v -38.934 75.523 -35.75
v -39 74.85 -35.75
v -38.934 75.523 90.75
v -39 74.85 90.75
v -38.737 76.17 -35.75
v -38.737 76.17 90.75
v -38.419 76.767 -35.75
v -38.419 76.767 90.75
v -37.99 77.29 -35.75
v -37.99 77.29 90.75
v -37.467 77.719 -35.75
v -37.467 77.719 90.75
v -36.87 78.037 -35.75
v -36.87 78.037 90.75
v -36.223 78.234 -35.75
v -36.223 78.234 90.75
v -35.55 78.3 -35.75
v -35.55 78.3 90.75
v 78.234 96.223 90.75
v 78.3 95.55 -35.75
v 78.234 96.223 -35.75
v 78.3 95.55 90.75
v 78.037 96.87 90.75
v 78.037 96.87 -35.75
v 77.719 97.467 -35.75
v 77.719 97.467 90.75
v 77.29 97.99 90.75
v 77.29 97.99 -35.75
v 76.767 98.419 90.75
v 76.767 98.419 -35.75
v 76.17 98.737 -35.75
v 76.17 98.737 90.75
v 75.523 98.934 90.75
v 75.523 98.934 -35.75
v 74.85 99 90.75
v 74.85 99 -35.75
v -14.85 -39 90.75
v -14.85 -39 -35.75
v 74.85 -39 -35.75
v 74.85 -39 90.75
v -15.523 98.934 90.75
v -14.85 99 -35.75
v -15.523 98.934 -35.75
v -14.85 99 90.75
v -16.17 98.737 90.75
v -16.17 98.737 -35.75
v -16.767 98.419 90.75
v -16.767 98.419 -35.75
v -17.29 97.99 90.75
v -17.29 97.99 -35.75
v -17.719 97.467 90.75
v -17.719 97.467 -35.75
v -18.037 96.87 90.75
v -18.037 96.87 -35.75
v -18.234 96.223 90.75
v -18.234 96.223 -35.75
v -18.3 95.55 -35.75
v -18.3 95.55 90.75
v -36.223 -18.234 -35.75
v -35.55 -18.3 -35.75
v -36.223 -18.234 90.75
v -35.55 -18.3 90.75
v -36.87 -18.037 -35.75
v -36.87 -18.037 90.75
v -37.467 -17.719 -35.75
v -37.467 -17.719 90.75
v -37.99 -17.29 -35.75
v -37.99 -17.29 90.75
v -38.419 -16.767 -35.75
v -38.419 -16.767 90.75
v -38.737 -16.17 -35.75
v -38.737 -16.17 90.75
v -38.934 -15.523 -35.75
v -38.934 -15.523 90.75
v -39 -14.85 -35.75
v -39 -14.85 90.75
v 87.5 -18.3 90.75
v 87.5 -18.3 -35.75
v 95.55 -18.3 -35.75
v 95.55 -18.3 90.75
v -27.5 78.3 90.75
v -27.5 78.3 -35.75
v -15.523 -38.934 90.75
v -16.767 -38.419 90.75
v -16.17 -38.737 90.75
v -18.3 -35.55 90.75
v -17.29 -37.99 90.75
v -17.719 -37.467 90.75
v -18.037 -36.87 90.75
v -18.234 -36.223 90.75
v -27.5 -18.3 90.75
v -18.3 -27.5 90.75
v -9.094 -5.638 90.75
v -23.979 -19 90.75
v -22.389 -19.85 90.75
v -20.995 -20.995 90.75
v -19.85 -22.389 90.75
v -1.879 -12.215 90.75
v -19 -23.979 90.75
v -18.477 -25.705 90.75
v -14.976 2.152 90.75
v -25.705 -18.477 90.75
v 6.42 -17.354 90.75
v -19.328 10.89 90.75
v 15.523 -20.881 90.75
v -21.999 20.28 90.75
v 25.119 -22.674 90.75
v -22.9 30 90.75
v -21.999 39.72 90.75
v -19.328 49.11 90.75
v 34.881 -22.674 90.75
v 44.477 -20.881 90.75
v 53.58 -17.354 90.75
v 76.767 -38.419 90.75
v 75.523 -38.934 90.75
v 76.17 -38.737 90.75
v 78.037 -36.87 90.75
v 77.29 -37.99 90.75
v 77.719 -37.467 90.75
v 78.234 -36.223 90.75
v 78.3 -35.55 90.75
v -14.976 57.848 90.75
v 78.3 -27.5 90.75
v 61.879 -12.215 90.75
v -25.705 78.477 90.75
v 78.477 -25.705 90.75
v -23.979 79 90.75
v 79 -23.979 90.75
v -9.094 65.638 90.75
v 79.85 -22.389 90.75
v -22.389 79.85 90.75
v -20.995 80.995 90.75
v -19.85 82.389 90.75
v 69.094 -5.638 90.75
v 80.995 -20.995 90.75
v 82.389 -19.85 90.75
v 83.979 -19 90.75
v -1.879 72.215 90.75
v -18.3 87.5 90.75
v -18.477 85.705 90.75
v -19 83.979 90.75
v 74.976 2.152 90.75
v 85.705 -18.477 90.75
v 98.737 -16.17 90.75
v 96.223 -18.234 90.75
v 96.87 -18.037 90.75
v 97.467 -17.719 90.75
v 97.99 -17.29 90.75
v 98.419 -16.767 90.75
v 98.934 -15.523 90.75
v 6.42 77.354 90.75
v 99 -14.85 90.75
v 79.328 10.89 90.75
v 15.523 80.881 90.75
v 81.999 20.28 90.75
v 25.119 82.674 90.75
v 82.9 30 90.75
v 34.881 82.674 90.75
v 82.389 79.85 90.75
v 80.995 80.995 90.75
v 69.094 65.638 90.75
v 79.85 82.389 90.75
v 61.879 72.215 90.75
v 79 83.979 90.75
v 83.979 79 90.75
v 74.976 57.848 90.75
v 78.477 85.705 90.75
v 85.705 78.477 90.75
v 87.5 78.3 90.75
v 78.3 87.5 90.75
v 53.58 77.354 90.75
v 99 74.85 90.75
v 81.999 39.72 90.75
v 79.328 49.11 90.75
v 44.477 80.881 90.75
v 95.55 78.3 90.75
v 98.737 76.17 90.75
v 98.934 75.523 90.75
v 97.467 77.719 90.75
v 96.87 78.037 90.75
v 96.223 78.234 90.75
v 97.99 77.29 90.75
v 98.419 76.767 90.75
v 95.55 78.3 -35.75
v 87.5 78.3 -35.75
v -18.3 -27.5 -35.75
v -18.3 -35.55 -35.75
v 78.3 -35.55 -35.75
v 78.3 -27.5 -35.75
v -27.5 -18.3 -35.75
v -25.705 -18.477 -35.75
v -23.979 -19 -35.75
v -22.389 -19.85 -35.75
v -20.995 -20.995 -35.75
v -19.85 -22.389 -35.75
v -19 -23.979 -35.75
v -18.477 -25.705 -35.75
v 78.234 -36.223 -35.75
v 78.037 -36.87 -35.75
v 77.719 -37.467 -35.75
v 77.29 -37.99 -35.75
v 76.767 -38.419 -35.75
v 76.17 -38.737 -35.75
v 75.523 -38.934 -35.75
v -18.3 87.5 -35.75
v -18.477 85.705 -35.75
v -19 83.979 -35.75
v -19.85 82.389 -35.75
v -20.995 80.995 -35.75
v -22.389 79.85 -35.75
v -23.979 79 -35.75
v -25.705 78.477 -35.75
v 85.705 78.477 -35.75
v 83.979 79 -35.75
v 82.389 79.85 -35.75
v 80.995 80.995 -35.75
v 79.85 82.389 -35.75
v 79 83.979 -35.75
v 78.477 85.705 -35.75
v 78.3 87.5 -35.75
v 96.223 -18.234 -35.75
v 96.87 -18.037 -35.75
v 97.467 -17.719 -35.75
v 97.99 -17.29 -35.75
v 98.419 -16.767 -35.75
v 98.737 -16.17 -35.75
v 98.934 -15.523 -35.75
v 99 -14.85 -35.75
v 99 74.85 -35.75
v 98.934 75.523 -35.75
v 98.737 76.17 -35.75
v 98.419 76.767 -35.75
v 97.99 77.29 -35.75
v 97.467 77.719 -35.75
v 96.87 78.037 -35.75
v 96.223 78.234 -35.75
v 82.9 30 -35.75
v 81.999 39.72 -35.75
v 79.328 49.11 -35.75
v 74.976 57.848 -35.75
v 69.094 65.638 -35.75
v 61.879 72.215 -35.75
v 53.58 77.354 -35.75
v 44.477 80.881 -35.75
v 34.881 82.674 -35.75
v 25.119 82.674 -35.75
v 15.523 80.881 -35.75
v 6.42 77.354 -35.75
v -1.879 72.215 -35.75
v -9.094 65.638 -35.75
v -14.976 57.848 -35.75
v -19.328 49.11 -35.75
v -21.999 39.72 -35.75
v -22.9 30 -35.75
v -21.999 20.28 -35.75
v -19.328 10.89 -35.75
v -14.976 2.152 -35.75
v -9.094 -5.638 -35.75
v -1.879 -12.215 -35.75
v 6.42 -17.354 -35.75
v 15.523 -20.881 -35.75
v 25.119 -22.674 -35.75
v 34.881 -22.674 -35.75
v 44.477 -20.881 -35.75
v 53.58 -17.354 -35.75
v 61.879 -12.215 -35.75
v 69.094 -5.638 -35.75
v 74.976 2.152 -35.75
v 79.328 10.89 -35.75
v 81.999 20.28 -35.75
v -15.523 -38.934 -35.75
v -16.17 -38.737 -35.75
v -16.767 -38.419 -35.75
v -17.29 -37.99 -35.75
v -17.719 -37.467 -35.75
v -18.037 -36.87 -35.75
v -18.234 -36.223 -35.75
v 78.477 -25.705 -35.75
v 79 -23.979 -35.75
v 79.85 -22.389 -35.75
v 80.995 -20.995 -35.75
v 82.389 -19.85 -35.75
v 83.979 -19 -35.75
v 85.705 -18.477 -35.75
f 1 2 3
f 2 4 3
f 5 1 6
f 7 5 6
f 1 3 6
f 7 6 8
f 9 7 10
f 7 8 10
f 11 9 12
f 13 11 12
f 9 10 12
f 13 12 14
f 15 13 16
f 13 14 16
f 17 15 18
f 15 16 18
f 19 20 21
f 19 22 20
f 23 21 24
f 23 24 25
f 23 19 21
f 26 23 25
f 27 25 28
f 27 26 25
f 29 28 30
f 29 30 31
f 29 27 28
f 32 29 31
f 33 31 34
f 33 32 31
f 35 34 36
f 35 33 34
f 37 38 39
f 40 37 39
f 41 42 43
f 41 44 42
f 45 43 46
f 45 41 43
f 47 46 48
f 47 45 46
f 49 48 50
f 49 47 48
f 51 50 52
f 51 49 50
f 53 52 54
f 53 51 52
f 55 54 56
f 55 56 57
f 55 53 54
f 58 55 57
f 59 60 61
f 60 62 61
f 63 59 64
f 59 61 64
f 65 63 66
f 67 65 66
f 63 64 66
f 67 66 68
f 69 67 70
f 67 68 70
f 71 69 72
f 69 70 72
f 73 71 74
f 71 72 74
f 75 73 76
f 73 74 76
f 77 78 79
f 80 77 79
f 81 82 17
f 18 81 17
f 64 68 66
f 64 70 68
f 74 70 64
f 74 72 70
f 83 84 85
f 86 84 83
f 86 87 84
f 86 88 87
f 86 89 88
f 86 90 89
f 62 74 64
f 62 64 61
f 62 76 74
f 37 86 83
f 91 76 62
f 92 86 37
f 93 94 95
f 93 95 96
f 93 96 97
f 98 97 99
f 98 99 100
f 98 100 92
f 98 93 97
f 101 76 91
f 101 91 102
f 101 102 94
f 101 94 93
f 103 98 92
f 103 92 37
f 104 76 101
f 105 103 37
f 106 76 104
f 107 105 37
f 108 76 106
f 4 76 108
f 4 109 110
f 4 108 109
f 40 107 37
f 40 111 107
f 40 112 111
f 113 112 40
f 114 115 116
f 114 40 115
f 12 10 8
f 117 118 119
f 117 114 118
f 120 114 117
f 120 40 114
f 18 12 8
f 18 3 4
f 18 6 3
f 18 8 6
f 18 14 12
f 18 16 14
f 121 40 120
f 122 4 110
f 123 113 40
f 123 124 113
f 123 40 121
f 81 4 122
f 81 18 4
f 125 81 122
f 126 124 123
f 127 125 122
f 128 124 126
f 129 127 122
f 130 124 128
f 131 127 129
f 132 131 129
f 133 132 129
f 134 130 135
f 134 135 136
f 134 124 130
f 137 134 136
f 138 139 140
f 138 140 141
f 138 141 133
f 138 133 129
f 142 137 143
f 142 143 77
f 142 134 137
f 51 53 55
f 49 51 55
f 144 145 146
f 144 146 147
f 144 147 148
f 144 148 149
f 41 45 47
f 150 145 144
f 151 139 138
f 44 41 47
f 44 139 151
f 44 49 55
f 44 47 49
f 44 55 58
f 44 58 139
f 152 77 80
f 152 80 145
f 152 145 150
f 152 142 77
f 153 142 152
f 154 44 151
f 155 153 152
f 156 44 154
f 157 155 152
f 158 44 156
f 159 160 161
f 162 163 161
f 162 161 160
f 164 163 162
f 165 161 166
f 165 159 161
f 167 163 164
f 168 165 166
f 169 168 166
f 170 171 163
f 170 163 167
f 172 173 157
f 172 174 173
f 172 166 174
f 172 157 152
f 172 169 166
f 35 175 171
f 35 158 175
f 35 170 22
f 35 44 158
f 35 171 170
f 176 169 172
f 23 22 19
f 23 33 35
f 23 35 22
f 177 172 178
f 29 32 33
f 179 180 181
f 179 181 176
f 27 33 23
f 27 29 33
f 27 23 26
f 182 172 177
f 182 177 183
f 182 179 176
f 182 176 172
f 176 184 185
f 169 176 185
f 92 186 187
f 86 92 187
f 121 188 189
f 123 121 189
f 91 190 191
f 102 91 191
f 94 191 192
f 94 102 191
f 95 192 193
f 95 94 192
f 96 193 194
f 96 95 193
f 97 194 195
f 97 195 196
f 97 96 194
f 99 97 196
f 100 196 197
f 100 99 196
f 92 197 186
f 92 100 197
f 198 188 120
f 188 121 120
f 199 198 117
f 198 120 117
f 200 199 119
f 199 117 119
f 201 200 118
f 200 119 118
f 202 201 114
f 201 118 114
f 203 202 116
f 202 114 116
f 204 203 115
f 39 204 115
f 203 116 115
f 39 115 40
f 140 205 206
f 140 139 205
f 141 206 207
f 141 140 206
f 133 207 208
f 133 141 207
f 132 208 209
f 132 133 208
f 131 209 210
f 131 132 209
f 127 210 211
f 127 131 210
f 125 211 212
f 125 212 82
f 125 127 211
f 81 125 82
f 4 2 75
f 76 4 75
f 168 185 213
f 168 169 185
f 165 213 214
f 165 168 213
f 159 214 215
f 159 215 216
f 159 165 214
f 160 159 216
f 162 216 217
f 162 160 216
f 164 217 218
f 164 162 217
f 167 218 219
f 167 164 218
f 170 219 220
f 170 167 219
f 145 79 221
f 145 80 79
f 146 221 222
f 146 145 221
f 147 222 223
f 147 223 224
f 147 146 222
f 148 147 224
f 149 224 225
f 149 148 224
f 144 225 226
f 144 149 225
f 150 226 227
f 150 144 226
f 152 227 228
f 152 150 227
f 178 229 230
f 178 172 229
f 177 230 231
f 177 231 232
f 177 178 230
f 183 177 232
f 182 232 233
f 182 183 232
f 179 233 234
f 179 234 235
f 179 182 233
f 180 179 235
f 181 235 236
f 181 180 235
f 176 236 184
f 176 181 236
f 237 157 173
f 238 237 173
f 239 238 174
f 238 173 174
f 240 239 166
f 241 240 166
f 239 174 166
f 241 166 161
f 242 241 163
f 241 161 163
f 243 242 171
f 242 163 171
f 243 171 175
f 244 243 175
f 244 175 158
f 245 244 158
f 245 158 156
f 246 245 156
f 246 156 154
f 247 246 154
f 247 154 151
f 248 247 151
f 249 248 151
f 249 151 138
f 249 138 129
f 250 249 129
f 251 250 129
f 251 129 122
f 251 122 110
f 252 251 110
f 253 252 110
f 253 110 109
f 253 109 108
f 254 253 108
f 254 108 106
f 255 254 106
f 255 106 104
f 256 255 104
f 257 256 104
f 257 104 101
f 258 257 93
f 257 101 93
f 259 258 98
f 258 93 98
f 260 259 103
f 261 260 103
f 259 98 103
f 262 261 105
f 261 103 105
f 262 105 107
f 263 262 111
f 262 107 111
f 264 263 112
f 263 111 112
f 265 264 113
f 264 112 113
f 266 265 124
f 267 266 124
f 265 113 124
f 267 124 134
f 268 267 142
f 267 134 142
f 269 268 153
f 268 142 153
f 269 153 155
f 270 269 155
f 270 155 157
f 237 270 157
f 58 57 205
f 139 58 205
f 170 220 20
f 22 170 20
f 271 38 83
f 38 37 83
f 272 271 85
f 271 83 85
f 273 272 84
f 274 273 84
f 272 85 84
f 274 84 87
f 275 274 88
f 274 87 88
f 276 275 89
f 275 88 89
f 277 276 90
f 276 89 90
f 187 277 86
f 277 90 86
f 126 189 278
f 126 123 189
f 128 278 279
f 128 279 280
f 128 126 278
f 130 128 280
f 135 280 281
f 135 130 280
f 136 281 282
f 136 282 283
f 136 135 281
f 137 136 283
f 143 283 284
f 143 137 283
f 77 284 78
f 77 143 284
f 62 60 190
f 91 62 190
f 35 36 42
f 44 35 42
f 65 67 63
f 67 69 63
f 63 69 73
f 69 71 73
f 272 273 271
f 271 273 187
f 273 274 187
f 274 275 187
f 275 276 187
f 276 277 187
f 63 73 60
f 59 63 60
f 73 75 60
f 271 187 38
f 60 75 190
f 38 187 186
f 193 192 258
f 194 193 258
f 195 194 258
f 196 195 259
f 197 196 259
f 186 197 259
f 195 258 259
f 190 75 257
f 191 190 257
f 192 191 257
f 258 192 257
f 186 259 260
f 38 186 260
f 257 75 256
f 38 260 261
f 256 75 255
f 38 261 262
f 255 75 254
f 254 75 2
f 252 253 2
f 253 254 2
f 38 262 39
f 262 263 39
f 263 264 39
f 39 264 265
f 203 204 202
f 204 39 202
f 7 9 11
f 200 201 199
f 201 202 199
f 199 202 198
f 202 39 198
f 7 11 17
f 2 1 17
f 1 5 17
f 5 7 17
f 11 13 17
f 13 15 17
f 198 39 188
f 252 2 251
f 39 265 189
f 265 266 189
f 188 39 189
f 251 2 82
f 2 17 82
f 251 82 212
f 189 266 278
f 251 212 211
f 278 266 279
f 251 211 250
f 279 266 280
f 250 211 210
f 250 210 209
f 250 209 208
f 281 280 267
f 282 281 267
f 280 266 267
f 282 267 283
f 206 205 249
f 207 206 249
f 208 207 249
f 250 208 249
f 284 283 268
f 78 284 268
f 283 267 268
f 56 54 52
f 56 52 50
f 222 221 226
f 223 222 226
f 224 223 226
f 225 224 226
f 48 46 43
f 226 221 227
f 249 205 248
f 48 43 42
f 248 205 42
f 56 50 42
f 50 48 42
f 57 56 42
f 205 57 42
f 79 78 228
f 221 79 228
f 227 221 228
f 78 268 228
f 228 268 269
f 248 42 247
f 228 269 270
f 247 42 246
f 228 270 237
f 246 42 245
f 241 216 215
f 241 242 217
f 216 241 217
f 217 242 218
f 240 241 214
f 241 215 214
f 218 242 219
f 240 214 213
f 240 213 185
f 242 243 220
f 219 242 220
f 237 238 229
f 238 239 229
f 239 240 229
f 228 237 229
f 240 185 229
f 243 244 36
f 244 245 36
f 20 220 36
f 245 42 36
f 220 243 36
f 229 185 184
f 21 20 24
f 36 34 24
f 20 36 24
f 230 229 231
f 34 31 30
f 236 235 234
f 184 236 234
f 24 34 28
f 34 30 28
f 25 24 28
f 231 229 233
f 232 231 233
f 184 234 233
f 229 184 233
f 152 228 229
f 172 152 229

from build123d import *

# Parameters (mm, degrees)
BOSS_EXTRUDE1_DEPTH = 55
FILLET1_R           = 4
FILLET2_R           = 1.5
SKETCH2_R           = 23
CUT_EXTRUDE1_DEPTH  = 102.118742081
SCALE1_SCALE        = 2.3


with BuildPart() as part:
    # Sketch1 → Boss-Extrude1 (new body)
    with BuildSketch(Plane.XY):
        Polygon((9, 0), (51, 0), (51, 9), (60, 9), (60, 51), (51, 51), (51, 60), (9, 60), (9, 51), (0, 51), (0, 9), (9, 9), align=None)
    extrude(amount=BOSS_EXTRUDE1_DEPTH)

    # Fillet1
    fillet1_edges = [part.edges().sort_by_distance(p)[0] for p in [
        (9, 9, 27.5),
        (9, 51, 27.5),
        (51, 51, 27.5),
        (51, 9, 27.5),
    ]]
    fillet(fillet1_edges, radius=FILLET1_R)

    # Fillet2
    fillet2_edges = [part.edges().sort_by_distance(p)[0] for p in [
        (51, 0, 27.5),
        (9, 0, 27.5),
        (0, 9, 27.5),
        (0, 51, 27.5),
        (9, 60, 27.5),
        (51, 60, 27.5),
        (60, 51, 27.5),
        (60, 9, 27.5),
    ]]
    fillet(fillet2_edges, radius=FILLET2_R)

    # Sketch2 → Cut-Extrude1 (cut, through all)
    with BuildSketch(Plane.XY.offset(55)):
        with Locations((30, 30)):
            Circle(SKETCH2_R)
    extrude(amount=-CUT_EXTRUDE1_DEPTH, mode=Mode.SUBTRACT)


with BuildPart() as part_1:
    # Scale1: scaled about (30, 30, 27.5)
    add(part.part.scale(SCALE1_SCALE).moved(Location((-39, -39, -35.75))))


solid = part_1.part
